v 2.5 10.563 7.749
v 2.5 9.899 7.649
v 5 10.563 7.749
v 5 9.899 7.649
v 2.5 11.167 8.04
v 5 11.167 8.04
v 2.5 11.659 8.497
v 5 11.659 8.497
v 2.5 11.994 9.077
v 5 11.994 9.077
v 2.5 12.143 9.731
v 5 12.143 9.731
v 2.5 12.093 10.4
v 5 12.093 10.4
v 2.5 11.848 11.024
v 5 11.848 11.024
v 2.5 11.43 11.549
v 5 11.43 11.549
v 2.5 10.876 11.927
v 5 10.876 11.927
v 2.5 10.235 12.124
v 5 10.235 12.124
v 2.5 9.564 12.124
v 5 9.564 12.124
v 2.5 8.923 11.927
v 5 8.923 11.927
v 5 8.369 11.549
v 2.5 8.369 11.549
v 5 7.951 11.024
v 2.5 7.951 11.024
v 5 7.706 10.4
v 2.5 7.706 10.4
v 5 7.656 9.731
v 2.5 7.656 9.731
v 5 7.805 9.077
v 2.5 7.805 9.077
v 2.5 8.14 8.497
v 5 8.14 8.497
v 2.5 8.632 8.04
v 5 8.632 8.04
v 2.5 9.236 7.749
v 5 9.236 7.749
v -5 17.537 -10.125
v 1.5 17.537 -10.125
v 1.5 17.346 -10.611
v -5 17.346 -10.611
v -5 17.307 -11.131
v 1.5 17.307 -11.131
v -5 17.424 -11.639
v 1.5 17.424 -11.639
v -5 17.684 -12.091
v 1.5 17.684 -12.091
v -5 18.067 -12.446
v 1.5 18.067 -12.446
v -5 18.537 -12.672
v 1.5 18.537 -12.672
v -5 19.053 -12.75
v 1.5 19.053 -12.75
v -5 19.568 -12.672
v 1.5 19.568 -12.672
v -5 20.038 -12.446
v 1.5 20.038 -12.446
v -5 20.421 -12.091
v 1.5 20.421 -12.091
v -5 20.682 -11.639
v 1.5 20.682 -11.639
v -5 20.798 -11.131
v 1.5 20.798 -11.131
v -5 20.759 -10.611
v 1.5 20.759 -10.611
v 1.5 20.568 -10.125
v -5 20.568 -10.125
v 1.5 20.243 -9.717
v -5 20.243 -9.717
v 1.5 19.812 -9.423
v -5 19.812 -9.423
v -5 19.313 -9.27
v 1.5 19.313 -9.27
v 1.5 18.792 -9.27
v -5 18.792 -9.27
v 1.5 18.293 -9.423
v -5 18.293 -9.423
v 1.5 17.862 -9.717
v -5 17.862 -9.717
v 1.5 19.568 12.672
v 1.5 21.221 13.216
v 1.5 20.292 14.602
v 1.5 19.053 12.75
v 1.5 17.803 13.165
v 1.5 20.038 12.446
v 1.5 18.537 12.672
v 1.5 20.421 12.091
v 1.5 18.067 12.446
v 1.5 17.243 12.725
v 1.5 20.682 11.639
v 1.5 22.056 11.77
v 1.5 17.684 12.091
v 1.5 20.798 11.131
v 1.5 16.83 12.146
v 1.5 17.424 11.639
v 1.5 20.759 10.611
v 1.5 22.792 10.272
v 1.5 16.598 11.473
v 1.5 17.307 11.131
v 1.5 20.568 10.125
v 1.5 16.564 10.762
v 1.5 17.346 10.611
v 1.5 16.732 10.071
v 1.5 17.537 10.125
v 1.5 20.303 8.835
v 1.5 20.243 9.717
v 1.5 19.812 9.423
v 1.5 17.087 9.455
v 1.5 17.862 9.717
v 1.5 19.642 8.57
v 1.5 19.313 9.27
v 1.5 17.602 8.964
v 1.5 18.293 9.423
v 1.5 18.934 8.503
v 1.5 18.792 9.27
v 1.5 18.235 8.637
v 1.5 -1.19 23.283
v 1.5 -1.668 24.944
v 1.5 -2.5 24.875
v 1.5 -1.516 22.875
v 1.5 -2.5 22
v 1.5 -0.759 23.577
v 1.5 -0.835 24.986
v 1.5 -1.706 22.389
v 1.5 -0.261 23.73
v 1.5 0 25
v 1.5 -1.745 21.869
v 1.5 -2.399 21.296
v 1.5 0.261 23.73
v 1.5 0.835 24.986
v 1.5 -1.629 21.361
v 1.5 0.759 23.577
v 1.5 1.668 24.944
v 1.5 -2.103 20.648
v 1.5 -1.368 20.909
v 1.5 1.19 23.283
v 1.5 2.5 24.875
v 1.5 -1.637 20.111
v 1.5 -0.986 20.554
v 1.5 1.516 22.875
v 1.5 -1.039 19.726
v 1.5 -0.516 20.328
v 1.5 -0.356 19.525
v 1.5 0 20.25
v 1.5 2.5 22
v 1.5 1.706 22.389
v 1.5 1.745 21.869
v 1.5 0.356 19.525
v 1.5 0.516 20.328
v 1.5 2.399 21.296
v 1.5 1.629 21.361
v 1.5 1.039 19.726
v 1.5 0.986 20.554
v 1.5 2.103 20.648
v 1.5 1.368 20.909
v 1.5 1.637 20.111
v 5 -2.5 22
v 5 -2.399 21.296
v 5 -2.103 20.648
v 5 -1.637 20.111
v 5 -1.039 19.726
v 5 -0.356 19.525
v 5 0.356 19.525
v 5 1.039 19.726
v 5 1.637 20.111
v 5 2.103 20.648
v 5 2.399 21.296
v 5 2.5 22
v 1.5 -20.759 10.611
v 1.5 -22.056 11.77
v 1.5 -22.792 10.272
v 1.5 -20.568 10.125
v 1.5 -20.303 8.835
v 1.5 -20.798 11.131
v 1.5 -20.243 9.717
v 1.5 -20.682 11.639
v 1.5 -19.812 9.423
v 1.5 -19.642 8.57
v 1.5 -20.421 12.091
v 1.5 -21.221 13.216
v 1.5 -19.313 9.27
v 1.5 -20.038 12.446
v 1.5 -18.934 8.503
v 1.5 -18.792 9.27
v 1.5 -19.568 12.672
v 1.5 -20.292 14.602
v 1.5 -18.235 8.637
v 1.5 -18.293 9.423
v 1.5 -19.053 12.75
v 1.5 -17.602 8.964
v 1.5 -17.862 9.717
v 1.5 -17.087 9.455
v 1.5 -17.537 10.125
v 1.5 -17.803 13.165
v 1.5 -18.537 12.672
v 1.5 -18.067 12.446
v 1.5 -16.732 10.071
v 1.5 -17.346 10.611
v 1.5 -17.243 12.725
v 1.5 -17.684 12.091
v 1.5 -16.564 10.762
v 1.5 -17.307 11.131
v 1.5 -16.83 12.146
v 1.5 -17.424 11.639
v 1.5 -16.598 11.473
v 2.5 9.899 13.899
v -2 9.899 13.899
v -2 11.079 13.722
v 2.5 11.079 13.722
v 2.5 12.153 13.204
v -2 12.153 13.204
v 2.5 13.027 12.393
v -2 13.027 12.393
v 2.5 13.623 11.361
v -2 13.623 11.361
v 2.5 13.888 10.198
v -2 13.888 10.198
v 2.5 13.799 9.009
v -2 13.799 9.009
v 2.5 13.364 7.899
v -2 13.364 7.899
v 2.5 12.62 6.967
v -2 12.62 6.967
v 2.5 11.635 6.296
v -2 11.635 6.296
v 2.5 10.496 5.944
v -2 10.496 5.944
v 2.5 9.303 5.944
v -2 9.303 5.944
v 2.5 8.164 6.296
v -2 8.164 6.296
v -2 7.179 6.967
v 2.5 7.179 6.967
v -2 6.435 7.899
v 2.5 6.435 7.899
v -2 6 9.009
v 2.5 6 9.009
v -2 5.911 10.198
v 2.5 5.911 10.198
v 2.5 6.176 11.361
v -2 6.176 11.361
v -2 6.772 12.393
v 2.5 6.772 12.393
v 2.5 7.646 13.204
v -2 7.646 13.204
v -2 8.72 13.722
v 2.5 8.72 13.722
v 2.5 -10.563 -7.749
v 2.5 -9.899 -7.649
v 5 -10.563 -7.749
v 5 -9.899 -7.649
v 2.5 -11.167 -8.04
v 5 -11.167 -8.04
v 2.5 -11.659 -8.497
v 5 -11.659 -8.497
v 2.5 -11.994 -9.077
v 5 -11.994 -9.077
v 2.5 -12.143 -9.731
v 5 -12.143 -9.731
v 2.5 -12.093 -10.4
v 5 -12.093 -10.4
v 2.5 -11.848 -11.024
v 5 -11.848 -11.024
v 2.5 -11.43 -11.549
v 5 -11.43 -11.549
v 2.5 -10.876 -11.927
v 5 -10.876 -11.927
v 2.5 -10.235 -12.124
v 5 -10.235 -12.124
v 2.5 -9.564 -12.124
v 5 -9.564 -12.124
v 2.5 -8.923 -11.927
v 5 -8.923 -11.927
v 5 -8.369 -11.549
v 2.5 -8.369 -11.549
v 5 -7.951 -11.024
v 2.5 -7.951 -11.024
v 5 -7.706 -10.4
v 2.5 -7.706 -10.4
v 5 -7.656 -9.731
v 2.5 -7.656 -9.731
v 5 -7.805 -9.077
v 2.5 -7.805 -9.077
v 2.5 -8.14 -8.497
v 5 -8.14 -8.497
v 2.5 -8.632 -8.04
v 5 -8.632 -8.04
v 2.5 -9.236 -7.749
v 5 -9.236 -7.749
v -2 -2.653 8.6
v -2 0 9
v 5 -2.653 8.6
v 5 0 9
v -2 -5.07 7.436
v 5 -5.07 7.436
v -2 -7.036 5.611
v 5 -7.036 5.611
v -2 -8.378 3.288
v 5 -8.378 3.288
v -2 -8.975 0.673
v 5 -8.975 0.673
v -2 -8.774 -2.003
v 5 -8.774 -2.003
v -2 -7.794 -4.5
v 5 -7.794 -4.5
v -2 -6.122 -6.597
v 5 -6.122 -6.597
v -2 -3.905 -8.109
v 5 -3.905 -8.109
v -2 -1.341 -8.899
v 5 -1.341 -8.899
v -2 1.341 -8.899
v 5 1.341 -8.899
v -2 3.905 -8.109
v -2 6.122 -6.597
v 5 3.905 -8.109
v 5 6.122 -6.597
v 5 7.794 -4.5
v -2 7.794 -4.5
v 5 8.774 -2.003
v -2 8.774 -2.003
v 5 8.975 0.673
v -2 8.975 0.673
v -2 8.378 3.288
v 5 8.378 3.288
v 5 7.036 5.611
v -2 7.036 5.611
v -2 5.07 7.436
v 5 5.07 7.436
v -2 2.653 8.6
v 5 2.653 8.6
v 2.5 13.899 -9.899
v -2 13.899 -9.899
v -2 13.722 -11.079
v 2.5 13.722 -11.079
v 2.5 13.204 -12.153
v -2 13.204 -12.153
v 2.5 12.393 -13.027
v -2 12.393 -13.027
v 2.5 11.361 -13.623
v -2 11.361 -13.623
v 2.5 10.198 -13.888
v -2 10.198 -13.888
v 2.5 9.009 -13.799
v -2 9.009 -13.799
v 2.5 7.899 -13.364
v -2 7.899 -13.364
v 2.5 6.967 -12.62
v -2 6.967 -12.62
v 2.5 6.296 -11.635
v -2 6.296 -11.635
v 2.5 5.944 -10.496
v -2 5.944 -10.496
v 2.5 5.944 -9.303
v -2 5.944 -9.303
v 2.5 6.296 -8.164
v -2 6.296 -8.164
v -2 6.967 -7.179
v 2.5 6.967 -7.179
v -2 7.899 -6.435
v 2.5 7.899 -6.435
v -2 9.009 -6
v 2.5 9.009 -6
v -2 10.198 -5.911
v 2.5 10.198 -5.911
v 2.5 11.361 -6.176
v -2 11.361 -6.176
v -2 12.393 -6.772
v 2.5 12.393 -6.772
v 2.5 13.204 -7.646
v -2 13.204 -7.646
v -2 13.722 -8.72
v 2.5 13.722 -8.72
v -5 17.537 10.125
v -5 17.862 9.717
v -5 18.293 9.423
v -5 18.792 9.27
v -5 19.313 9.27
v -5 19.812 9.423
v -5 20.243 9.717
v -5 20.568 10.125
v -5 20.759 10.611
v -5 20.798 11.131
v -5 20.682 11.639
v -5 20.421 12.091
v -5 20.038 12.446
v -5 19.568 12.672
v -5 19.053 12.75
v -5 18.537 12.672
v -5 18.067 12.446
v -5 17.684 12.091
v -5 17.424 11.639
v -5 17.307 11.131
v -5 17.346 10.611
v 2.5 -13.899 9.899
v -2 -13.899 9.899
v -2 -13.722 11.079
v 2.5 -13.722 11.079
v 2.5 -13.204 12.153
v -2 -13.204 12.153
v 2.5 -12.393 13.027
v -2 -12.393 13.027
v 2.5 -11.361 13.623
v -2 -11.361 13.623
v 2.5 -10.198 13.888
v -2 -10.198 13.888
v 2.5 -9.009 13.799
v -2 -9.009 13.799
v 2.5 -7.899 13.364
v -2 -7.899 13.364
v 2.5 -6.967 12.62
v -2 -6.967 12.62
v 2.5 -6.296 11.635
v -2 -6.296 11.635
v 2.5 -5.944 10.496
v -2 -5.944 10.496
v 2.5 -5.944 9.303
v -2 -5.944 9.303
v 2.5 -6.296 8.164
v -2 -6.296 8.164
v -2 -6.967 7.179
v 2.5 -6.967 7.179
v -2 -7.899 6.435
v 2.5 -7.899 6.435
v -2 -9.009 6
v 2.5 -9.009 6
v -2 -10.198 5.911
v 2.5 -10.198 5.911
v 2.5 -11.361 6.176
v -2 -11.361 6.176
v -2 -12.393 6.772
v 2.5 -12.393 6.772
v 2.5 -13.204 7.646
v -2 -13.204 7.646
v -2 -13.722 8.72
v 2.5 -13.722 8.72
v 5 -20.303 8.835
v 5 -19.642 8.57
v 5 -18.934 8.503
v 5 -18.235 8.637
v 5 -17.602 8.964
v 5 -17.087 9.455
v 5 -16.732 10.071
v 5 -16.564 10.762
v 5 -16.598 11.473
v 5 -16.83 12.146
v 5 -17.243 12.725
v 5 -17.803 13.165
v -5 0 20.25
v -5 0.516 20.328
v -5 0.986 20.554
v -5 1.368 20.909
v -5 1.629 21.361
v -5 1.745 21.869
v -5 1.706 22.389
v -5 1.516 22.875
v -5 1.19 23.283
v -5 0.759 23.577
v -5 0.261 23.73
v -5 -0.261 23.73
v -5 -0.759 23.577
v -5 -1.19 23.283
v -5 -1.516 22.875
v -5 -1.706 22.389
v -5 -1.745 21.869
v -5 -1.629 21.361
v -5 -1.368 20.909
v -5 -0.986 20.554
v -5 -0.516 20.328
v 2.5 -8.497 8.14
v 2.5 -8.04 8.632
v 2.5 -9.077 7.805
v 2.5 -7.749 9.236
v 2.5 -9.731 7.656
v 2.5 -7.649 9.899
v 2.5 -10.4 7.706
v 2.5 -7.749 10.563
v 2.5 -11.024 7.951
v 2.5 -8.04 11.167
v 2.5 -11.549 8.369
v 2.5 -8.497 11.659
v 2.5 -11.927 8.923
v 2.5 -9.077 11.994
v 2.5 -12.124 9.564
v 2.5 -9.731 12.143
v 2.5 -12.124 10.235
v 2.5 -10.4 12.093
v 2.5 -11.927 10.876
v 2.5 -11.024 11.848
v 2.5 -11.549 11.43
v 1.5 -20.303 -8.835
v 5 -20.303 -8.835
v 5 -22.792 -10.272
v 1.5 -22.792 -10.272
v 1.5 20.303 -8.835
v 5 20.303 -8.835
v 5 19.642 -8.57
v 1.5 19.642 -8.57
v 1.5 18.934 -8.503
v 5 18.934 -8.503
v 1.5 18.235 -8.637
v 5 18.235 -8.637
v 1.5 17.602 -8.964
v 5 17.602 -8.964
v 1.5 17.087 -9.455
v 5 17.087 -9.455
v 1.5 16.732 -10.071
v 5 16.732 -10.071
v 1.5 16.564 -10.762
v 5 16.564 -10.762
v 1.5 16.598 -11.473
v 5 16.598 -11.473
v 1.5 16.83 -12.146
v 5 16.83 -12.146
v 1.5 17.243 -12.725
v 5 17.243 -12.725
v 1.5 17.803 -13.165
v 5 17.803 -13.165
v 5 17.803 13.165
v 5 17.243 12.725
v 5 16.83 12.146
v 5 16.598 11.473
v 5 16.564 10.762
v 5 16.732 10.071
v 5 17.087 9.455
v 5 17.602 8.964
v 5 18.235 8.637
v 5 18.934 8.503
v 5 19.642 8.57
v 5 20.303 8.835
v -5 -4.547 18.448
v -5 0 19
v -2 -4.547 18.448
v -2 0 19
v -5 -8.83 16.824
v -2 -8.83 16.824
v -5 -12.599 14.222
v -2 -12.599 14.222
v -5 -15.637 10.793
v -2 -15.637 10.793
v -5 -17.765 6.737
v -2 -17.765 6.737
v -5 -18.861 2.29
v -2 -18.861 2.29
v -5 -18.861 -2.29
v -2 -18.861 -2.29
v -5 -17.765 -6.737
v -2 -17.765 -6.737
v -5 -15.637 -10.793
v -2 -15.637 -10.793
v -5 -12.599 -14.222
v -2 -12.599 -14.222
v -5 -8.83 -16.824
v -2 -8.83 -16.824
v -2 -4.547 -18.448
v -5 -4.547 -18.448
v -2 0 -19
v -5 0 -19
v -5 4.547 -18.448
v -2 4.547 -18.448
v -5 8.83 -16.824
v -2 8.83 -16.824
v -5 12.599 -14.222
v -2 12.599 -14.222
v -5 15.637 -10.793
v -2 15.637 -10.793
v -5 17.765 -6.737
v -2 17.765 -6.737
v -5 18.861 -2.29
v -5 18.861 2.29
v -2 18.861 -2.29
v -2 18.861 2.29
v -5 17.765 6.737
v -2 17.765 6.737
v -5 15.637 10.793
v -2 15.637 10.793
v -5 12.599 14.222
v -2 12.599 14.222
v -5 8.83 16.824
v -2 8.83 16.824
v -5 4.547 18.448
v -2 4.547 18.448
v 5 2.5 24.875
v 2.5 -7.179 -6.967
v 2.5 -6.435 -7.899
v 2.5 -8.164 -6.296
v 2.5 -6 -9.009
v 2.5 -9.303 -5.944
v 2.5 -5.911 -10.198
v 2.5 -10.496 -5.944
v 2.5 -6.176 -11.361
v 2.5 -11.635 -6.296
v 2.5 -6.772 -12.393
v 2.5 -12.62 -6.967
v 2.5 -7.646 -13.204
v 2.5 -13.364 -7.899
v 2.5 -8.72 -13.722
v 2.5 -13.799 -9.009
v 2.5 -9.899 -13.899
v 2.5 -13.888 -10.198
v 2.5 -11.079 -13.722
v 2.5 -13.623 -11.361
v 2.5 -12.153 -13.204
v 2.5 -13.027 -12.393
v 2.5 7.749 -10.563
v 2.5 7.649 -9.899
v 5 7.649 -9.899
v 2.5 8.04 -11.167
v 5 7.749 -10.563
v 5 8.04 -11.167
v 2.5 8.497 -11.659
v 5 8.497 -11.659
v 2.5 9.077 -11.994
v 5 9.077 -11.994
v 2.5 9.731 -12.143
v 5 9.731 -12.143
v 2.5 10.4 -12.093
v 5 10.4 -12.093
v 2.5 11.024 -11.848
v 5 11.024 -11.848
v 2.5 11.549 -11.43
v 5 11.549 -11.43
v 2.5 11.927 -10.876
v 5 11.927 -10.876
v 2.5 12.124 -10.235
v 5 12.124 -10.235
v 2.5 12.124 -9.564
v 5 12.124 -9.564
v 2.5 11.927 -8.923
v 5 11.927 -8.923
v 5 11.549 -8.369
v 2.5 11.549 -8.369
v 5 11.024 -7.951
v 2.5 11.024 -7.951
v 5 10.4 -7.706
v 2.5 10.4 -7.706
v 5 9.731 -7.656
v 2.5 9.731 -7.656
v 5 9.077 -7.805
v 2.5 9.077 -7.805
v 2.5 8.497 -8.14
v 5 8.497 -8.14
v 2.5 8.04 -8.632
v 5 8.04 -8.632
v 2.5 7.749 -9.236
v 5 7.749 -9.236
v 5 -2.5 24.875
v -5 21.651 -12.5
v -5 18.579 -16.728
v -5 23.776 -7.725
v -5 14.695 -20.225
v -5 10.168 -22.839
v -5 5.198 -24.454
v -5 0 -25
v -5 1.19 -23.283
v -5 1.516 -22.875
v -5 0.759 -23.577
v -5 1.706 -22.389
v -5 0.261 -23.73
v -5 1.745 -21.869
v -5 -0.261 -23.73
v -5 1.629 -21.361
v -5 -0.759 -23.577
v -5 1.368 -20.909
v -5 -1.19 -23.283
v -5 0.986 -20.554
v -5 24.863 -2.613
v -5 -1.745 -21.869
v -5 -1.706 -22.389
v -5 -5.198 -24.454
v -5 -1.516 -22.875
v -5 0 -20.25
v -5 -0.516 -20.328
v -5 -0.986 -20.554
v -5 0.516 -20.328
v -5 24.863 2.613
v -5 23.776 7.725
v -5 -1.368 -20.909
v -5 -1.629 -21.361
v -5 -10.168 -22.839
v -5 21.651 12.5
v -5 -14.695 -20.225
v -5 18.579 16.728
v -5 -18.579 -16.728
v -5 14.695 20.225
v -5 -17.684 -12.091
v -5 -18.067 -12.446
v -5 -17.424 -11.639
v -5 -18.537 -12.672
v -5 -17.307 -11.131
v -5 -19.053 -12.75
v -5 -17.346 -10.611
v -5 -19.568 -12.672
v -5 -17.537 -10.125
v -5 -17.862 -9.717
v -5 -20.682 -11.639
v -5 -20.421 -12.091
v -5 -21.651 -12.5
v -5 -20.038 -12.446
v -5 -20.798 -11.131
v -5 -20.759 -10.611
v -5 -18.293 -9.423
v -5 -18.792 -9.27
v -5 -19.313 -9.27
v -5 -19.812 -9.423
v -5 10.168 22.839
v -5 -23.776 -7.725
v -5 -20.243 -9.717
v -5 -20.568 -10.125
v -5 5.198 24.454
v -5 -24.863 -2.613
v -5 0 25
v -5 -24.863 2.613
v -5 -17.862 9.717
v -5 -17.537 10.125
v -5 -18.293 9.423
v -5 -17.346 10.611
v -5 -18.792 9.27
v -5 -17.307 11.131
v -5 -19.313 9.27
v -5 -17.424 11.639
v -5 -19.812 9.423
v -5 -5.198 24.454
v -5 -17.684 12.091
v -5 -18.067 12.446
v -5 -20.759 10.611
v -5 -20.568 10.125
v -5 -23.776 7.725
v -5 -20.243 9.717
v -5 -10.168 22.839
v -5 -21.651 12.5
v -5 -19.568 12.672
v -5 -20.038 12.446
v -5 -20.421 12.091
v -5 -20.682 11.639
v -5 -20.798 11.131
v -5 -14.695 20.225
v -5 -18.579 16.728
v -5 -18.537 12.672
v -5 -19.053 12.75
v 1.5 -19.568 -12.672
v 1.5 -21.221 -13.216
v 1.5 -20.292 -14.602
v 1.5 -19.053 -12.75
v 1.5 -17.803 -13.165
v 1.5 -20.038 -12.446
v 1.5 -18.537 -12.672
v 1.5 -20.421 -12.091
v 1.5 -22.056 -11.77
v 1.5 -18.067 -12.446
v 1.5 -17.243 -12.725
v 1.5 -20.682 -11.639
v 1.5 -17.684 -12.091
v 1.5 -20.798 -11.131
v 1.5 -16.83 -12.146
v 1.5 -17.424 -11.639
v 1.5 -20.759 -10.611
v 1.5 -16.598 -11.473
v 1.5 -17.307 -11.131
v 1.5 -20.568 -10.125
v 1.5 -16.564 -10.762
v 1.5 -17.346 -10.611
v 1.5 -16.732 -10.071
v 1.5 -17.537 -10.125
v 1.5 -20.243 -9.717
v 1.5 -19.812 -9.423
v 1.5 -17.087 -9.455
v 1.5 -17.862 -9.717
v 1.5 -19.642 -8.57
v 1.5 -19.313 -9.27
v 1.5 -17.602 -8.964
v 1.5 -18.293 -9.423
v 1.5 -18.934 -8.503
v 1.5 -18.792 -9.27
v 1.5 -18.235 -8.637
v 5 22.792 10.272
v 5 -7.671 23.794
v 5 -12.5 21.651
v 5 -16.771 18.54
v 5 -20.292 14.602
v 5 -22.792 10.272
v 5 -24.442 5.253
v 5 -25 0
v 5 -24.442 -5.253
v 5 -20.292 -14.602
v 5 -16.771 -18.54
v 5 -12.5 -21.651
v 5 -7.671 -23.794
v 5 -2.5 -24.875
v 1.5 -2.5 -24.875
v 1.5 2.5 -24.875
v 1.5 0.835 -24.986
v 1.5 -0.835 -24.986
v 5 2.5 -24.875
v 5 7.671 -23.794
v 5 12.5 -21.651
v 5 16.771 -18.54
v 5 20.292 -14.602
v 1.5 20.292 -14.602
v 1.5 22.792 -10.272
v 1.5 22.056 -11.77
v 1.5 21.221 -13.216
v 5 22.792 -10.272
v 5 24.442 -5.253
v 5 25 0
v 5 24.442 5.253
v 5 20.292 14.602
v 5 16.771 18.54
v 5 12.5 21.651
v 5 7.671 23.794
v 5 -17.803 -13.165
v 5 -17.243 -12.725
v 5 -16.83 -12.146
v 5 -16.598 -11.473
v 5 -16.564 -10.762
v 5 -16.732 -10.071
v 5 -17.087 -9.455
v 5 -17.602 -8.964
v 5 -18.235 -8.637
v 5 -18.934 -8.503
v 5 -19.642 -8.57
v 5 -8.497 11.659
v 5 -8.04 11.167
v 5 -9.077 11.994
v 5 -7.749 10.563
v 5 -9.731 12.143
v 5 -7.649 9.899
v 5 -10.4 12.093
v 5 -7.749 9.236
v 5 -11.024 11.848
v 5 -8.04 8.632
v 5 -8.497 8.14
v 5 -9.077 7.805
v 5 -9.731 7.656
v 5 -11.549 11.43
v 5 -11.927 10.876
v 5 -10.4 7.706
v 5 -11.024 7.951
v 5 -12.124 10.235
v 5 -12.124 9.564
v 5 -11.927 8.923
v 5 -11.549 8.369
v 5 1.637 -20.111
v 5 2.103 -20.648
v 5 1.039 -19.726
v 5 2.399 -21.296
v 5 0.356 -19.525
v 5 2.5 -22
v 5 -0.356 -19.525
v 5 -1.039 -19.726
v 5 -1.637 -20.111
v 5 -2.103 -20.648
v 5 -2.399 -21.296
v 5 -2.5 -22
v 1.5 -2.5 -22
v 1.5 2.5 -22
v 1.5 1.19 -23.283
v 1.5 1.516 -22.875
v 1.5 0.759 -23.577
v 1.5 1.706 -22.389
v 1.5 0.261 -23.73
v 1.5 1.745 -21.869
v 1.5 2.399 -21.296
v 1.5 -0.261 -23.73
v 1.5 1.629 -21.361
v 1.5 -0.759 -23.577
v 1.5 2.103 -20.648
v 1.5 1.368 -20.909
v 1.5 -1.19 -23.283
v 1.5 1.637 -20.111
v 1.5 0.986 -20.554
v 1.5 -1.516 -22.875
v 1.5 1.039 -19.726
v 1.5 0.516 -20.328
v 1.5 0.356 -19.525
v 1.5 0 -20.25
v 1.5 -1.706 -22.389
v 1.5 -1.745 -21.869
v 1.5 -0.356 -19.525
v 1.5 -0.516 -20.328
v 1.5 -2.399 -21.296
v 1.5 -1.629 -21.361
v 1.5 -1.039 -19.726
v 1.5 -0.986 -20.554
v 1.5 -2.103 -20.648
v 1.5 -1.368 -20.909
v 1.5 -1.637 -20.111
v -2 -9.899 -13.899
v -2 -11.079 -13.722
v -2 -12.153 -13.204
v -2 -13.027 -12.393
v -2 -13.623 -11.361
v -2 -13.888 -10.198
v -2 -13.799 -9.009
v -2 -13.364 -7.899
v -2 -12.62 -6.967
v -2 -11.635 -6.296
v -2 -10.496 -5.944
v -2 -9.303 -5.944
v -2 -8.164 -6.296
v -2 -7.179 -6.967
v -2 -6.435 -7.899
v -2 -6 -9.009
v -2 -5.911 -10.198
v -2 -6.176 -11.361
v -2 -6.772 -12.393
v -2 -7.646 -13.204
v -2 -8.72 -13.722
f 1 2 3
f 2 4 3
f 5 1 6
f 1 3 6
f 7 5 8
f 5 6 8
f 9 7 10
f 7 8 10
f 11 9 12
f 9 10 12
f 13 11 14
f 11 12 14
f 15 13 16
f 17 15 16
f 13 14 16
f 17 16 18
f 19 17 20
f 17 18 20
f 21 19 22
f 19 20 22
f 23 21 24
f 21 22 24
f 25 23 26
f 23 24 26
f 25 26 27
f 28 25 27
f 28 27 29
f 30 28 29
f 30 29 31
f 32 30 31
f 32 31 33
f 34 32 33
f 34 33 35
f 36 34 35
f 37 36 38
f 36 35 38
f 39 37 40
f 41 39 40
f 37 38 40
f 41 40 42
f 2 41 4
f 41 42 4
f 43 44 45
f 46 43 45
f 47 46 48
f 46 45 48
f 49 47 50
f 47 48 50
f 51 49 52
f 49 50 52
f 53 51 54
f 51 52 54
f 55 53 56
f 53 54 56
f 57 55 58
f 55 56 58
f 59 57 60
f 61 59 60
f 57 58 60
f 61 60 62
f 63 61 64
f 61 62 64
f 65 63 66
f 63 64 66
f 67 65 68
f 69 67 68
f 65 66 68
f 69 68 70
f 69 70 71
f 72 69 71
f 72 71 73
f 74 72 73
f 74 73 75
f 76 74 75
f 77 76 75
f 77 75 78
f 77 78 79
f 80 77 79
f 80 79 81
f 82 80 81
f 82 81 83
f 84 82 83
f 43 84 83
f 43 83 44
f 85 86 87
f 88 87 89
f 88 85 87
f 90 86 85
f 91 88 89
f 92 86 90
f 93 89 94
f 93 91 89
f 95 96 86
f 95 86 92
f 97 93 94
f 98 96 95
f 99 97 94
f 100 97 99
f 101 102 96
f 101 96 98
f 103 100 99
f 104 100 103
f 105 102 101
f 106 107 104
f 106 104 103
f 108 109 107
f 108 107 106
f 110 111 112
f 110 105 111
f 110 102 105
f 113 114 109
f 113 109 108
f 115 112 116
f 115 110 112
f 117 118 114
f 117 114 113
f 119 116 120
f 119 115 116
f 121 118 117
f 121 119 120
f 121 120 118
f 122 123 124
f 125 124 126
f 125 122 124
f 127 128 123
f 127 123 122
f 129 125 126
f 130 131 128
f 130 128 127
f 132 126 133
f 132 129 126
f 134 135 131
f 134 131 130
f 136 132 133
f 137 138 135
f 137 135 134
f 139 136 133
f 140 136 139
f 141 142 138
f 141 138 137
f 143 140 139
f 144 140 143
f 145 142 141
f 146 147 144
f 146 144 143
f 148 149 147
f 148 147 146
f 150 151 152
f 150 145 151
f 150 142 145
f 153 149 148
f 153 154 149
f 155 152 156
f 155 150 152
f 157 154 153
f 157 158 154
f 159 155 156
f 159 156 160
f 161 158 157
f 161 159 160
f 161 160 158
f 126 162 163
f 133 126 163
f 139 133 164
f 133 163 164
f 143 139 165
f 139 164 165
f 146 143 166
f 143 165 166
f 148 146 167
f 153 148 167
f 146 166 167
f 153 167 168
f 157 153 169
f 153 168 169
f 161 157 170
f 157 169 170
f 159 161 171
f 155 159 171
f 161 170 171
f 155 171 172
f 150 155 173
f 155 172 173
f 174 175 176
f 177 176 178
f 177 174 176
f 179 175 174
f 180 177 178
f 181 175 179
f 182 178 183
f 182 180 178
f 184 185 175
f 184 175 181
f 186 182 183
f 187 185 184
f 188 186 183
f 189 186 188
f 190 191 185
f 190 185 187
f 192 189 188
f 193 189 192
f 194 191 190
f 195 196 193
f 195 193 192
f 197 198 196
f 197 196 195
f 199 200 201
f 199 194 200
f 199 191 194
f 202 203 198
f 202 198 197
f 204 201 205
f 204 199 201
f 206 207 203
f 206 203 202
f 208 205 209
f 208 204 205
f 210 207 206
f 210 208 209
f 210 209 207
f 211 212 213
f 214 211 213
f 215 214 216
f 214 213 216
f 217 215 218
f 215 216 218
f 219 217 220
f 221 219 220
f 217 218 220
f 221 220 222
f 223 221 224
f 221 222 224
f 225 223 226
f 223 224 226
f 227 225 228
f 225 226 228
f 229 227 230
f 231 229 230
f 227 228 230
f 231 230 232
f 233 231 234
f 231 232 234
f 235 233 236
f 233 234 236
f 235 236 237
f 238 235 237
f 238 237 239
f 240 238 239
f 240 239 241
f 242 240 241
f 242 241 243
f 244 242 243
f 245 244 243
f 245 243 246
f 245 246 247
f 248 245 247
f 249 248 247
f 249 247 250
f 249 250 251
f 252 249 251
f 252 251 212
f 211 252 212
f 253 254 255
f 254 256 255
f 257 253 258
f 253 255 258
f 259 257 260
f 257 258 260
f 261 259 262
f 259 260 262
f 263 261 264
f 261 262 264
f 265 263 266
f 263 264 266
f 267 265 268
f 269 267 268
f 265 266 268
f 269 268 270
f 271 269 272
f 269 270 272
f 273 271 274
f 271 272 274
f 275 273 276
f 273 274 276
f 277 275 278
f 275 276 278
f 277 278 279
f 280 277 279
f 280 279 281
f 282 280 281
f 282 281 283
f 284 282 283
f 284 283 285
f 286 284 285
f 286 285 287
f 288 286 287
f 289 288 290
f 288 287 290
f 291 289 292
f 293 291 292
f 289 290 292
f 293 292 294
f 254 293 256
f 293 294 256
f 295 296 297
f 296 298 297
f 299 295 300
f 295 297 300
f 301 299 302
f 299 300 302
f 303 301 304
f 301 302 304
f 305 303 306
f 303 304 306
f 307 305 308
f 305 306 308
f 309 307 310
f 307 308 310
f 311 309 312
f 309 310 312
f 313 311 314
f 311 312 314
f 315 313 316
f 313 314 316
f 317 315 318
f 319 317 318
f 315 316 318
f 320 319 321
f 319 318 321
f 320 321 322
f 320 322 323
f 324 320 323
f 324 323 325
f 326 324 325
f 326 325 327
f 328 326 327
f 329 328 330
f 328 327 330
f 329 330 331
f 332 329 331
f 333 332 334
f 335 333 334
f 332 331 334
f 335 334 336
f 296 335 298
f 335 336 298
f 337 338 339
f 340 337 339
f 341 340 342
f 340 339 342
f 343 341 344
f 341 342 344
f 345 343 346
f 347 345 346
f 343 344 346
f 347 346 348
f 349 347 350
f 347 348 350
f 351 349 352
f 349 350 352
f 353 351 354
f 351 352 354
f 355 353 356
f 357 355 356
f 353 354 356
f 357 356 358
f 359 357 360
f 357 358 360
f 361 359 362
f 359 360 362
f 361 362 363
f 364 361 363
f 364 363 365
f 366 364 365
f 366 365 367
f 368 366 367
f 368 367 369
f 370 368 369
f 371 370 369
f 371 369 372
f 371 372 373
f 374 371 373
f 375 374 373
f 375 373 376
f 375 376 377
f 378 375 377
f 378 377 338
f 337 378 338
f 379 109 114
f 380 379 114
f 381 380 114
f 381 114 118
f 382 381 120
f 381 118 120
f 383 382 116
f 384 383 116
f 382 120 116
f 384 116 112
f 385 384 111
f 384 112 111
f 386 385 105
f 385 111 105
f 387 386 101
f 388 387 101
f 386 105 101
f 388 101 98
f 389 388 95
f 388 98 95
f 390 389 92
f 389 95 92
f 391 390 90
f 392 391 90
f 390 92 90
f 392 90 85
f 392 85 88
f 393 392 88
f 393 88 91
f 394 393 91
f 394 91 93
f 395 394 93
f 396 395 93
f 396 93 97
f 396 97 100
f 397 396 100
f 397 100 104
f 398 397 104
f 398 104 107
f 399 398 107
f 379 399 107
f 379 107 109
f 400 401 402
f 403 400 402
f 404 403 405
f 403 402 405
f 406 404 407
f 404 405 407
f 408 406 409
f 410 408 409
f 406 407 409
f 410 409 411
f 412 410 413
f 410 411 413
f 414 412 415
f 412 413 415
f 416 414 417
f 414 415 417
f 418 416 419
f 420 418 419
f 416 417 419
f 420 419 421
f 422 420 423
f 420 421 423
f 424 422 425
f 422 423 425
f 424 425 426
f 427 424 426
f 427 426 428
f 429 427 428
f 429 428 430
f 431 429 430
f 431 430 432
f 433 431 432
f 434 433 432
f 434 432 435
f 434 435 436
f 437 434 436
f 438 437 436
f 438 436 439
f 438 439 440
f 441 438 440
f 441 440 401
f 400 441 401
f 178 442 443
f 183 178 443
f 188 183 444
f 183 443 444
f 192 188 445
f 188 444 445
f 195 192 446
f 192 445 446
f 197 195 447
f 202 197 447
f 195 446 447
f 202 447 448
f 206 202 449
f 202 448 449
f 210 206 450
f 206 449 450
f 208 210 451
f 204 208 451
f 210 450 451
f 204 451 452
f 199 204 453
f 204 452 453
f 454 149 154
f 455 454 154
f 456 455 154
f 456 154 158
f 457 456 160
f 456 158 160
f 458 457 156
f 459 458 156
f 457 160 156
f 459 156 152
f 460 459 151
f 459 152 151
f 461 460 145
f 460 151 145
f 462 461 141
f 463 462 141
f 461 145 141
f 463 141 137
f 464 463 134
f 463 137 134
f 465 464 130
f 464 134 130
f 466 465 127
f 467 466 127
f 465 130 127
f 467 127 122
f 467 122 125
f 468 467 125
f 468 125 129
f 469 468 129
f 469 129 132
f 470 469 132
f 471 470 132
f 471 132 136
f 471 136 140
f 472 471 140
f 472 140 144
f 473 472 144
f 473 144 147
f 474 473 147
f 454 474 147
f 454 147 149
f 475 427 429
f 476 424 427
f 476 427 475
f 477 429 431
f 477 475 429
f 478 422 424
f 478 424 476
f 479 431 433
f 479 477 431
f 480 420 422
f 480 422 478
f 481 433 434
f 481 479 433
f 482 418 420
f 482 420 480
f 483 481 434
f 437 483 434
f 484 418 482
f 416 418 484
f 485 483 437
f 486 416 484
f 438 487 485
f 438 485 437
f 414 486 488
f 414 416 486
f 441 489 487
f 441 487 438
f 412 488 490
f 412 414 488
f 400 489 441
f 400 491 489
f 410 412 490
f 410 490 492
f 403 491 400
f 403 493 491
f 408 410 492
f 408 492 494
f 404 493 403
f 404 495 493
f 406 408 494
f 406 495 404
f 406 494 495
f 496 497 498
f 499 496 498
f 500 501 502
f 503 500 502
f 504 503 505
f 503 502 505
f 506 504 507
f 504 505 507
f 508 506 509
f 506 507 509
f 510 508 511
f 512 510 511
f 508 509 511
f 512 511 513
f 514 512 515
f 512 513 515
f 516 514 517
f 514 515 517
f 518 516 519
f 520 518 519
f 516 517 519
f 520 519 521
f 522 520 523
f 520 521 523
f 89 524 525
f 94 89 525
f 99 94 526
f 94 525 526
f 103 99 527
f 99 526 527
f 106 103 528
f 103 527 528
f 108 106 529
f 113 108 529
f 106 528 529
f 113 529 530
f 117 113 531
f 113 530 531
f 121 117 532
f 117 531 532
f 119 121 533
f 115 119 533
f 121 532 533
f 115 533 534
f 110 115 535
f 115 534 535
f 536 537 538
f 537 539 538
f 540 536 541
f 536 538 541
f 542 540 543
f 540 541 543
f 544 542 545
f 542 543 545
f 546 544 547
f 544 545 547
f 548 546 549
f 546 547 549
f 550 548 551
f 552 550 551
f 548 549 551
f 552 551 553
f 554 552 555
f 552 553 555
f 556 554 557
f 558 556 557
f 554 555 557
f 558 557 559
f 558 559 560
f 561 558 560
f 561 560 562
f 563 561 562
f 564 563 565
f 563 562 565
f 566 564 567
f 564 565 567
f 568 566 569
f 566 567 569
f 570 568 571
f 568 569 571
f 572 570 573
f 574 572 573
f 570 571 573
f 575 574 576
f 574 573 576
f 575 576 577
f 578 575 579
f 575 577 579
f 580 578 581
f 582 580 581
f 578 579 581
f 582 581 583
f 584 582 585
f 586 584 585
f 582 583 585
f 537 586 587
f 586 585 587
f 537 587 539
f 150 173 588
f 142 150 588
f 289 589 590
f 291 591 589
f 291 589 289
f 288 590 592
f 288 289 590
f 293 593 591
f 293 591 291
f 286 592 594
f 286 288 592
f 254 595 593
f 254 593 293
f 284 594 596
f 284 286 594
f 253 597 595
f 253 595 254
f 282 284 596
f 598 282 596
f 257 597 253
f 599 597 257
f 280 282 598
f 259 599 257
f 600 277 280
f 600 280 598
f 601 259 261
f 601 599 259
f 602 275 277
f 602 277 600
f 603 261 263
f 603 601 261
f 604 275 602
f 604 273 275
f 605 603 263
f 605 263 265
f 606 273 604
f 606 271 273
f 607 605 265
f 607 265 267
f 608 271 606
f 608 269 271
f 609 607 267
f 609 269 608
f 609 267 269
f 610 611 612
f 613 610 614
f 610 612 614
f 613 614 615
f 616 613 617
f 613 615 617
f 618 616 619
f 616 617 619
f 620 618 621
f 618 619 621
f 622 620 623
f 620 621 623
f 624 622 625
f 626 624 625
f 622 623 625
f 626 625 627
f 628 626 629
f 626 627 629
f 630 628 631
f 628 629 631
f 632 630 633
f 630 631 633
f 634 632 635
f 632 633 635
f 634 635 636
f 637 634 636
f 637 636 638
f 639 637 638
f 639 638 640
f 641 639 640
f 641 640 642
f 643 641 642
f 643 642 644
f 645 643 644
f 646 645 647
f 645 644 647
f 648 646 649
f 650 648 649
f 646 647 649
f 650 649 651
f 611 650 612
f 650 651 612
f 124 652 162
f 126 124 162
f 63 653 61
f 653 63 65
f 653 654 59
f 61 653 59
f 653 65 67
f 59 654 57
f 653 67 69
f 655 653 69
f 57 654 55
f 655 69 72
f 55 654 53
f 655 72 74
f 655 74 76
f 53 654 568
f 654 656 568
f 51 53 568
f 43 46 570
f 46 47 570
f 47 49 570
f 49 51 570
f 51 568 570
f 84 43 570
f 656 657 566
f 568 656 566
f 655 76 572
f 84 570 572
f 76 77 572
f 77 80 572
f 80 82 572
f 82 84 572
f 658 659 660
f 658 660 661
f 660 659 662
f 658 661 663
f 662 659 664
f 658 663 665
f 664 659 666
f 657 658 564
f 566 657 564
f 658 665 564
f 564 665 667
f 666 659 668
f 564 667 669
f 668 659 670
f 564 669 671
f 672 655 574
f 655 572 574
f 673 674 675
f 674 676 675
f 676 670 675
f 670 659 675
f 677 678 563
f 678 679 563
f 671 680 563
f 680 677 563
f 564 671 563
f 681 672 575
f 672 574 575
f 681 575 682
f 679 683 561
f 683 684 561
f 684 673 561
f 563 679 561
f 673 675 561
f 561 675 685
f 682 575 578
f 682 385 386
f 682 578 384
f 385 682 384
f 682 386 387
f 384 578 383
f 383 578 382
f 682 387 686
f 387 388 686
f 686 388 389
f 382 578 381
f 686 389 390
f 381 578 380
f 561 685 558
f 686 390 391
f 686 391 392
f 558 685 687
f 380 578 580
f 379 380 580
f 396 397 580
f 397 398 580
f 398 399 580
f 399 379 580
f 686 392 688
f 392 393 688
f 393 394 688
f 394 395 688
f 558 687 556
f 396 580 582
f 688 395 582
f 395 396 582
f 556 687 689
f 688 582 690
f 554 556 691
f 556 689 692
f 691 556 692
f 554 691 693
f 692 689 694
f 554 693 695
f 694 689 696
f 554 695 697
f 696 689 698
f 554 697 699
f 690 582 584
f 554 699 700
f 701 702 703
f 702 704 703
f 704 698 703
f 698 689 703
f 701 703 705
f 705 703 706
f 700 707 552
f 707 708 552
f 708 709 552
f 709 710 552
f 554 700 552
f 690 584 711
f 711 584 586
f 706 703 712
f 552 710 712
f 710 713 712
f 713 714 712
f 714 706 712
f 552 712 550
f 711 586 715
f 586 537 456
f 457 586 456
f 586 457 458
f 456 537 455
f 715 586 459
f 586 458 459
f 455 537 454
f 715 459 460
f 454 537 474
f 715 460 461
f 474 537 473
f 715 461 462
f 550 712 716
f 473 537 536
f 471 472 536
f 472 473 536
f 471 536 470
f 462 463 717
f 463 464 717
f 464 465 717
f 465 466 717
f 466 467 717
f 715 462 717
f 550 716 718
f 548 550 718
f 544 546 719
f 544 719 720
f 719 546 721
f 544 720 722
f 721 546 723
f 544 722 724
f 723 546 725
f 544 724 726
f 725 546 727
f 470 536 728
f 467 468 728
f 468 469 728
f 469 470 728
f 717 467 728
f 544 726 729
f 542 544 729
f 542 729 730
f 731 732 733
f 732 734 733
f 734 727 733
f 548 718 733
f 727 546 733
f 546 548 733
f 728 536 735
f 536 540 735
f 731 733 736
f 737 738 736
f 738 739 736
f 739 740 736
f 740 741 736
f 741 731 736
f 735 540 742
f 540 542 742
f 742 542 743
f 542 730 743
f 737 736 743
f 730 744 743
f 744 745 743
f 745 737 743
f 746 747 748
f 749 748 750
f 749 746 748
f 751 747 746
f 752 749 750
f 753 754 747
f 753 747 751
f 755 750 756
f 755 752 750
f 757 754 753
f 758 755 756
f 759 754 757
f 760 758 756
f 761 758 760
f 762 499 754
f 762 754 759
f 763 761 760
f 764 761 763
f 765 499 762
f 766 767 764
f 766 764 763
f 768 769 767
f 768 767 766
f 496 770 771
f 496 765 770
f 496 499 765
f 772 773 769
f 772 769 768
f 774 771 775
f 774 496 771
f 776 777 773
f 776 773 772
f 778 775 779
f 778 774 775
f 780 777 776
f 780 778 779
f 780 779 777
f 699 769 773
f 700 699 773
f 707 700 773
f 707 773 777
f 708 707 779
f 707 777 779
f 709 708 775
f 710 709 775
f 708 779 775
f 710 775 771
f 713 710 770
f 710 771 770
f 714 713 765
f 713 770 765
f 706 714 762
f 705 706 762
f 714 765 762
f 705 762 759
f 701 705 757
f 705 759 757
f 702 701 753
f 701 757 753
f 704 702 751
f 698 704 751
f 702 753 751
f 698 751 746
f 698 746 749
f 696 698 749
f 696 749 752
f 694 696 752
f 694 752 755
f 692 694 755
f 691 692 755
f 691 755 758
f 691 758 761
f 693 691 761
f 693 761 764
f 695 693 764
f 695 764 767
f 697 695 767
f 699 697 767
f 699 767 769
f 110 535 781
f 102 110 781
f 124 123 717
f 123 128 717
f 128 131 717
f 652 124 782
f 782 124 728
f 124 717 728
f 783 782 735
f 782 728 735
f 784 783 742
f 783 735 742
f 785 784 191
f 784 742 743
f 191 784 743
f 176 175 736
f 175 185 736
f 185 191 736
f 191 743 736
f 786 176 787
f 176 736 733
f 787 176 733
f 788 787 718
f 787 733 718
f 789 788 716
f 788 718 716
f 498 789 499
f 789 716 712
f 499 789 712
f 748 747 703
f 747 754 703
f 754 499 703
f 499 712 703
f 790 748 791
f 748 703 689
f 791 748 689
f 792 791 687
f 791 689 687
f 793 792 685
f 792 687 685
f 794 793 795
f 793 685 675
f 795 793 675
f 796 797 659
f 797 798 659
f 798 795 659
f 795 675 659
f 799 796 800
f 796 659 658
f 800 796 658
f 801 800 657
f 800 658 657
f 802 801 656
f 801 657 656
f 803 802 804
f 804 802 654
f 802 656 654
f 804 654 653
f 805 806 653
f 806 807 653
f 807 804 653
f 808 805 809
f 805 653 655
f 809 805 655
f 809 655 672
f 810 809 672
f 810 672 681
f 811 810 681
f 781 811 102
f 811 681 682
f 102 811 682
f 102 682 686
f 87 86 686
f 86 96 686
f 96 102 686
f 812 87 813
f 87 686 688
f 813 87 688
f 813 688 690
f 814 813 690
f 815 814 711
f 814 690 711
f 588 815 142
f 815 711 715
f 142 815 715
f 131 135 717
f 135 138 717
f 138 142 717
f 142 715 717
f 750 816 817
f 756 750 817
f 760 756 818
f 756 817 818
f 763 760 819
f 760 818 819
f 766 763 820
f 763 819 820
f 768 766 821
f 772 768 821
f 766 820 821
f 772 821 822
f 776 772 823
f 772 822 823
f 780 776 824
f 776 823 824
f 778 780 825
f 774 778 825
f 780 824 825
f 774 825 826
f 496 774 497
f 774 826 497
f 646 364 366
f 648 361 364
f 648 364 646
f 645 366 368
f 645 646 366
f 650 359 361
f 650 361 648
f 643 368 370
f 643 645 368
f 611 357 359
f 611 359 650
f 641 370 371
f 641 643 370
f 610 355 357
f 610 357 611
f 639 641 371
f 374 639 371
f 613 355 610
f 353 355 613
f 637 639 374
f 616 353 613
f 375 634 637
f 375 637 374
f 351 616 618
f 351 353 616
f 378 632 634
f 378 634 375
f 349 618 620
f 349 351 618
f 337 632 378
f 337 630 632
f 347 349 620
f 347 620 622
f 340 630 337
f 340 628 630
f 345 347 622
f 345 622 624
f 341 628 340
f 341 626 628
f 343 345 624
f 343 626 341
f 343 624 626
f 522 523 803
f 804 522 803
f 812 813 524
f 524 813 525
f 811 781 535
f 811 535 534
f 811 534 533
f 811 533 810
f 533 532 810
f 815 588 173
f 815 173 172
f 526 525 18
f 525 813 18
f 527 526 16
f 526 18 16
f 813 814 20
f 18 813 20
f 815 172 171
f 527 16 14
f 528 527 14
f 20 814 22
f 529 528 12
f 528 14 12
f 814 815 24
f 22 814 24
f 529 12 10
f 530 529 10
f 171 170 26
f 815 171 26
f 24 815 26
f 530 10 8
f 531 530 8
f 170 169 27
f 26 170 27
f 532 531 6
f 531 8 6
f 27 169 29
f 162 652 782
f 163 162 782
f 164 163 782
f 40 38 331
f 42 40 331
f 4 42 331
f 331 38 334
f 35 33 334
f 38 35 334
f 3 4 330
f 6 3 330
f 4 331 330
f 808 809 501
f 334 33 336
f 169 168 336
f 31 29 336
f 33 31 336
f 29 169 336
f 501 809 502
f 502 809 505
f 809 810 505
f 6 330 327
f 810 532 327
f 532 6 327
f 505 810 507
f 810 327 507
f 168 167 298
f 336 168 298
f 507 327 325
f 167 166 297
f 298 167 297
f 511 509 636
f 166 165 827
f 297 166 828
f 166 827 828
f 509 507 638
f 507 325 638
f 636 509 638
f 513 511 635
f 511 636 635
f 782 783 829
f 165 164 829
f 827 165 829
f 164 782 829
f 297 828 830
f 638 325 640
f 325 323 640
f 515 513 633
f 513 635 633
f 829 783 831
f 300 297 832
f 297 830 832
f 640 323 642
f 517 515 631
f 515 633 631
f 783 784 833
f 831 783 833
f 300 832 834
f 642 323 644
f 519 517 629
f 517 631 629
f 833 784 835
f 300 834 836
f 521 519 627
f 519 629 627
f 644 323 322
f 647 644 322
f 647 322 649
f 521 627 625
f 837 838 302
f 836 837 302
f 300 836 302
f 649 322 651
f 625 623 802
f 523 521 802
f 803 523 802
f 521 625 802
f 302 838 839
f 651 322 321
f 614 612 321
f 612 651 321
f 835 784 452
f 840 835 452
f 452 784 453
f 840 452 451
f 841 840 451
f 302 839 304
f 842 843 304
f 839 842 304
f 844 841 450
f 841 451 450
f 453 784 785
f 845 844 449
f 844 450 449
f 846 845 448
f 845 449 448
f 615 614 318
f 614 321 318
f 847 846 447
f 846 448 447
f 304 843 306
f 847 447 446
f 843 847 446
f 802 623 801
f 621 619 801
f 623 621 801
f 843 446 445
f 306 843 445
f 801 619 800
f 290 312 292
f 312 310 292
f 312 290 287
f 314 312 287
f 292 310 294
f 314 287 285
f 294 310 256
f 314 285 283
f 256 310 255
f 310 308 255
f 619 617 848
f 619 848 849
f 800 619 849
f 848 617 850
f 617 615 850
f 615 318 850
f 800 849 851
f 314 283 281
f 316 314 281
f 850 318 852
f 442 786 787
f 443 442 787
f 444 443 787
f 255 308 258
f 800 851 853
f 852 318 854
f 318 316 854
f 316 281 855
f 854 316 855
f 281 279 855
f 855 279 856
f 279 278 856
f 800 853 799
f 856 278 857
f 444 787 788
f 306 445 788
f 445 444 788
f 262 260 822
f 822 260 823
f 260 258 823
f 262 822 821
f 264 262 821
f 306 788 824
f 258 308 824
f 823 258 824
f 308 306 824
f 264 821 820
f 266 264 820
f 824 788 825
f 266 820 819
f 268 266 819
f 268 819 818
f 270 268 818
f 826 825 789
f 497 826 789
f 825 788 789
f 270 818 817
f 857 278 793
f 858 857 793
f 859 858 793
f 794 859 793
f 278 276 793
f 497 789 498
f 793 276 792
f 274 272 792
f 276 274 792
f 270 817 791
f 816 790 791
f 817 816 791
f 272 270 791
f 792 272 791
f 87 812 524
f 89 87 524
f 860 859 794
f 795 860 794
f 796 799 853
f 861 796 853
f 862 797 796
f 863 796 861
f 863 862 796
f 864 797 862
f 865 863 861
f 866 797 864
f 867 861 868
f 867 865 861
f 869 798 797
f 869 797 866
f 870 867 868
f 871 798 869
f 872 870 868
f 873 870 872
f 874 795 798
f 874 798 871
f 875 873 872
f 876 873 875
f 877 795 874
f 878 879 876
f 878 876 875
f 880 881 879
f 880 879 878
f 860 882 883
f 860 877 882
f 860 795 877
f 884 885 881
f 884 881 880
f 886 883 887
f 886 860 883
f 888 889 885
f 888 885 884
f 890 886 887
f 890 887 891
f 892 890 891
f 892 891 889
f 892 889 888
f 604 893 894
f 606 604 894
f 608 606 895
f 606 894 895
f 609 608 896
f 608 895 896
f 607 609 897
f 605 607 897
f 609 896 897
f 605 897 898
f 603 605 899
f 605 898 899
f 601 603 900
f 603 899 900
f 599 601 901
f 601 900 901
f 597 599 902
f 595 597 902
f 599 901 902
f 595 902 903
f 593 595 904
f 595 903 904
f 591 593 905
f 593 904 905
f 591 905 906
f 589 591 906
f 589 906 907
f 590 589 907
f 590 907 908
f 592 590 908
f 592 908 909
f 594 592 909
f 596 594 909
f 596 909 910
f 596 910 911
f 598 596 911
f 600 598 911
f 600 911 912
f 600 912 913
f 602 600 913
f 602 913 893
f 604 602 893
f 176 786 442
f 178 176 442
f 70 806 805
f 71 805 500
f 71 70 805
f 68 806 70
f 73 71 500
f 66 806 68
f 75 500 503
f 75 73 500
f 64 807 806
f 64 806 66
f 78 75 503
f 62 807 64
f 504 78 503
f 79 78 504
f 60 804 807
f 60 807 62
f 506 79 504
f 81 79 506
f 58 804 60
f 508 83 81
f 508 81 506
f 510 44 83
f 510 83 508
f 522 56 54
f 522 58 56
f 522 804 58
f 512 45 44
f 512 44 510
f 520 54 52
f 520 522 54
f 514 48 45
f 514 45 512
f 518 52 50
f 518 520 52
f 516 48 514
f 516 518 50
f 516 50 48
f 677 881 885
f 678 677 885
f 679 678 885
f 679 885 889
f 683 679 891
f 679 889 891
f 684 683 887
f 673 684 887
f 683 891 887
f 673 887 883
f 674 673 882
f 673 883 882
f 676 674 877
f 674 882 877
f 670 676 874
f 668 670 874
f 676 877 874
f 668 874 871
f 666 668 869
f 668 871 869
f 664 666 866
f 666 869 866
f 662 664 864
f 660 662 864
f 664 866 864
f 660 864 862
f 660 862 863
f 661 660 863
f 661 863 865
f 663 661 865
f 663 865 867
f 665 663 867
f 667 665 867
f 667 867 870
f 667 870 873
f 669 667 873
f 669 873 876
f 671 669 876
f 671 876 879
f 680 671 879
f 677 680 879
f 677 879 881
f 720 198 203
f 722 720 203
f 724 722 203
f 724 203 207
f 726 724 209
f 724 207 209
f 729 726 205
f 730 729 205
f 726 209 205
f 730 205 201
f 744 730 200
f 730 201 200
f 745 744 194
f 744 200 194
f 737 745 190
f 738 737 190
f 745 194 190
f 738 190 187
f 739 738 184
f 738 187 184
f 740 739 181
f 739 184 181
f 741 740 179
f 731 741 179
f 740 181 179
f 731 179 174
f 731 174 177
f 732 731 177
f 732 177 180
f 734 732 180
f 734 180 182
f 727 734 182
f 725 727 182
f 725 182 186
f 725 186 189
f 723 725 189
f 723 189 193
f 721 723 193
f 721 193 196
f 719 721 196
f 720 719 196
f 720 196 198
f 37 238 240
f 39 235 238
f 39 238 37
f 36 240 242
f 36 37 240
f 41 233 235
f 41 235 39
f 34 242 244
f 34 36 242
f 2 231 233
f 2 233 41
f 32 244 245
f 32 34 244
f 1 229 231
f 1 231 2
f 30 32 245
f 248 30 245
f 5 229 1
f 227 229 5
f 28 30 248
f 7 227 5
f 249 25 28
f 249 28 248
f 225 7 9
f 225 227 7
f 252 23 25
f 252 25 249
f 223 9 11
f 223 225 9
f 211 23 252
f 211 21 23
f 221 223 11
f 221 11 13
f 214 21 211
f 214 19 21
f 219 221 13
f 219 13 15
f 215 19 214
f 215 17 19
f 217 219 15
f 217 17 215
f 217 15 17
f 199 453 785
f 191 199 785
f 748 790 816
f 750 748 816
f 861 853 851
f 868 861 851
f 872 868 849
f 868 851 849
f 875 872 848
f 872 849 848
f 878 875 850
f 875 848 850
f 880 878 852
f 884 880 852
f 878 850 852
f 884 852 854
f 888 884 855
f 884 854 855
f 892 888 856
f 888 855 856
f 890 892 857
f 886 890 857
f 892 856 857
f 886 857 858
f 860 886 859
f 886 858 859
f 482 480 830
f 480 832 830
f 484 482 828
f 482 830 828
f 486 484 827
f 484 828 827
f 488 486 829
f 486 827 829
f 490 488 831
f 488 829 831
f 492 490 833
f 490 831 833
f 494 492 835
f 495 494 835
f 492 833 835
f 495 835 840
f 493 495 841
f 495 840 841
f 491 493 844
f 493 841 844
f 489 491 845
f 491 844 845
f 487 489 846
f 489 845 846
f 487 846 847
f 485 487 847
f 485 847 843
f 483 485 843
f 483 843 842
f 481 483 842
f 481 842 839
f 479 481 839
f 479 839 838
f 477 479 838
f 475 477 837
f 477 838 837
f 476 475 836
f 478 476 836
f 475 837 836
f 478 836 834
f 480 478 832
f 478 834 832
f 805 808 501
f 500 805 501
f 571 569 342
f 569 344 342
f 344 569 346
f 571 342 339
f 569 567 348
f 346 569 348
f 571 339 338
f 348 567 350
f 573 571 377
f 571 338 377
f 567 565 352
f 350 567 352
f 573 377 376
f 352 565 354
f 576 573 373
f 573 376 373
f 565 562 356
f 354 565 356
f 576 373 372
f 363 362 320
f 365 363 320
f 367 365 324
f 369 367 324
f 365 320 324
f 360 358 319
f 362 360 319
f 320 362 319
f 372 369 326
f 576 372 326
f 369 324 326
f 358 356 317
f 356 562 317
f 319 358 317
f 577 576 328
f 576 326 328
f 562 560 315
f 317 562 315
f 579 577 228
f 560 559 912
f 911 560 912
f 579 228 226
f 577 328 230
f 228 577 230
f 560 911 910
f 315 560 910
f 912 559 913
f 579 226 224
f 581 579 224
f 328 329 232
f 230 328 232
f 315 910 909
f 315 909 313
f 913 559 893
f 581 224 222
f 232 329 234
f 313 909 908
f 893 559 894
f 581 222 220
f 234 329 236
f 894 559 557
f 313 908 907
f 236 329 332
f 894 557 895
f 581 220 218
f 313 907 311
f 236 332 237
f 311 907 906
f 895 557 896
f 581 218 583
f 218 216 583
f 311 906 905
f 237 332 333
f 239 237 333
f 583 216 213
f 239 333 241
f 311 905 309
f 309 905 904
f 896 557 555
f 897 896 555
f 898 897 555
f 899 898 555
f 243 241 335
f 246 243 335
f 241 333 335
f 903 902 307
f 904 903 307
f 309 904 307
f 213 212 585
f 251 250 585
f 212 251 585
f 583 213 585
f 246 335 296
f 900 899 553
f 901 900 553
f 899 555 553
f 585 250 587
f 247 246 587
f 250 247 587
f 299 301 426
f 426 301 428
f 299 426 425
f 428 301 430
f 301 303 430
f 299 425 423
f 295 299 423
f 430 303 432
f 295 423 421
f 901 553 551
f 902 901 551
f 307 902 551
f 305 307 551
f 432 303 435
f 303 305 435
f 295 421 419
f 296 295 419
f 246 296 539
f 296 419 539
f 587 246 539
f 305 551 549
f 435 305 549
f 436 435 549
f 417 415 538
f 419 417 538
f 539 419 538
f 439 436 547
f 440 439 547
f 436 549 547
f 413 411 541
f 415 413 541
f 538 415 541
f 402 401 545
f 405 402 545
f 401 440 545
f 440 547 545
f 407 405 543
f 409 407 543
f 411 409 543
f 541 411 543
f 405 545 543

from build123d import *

# Parameters (mm, degrees)
ENL_V_MAT_EXTRU_1_DEPTH                         = 3.5
R_P_TITION_CIRCULAIRE1_COUNT                    = 6
ESQUISSE3_R                                     = 1.75
ENL_V_MAT_EXTRU_2_DEPTH                         = 36.947878936
R_P_TITION_CIRCULAIRE2_COUNT                    = 6
CHAMBRAGE_POUR_VIS_T_TE_CYLINDRIQUE_D           = 4.5
CHAMBRAGE_POUR_VIS_T_TE_CYLINDRIQUE_CBORE_D     = 8
CHAMBRAGE_POUR_VIS_T_TE_CYLINDRIQUE_CBORE_DEPTH = 4.5
R_P_TITION_CIRCULAIRE3_COUNT                    = 4


with BuildPart() as part:
    # Esquisse1 → Base-Révolution (revolve)
    with BuildSketch(Plane.XY, mode=Mode.PRIVATE) as base_r_volution_sk:
        Polygon((-5, 25), (-5, 19), (-2, 19), (-2, 9), (5, 9), (5, 25), align=None)
    revolve(base_r_volution_sk.sketch.rotate(Axis((-14.936373376, 0, 0), (1, 0, 0)), 90), axis=Axis((-14.936373376, 0, 0), (1, 0, 0)))

    # Esquisse2 → Enlèv. mat.-Extru.1 (cut)
    with BuildSketch(Plane(origin=(5, 0, 0), x_dir=(0, 0, -1), z_dir=(1, 0, 0))):
        with BuildLine():
            Line((-22, 2.5), (-25.435164017, 2.5))
            Line((-25.435164017, 2.5), (-25.435164017, -2.5))
            Line((-25.435164017, -2.5), (-22, -2.5))
            ThreePointArc((-22, -2.5), (-19.5, 0), (-22, 2.5))
        make_face()
    enl_v_mat_extru_1 = extrude(amount=-ENL_V_MAT_EXTRU_1_DEPTH, mode=Mode.SUBTRACT)

    # Répétition circulaire1: Enlèv. mat.-Extru.1 ×6 about axis
    r_p_tition_circulaire1_axis = Axis((0, 0, 0), (1, 0, 0))
    for i in range(1, R_P_TITION_CIRCULAIRE1_COUNT):
        add(enl_v_mat_extru_1.rotate(r_p_tition_circulaire1_axis, i * 360 / R_P_TITION_CIRCULAIRE1_COUNT), mode=Mode.SUBTRACT)

    # Esquisse3 → Enlèv. mat.-Extru.2 (cut, through all)
    with BuildSketch(Plane(origin=(1.5, 0, 0), x_dir=(0, 0, -1), z_dir=(1, 0, 0))):
        with Locations((-22, 0)):
            Circle(ESQUISSE3_R)
    enl_v_mat_extru_2 = extrude(amount=-ENL_V_MAT_EXTRU_2_DEPTH, mode=Mode.SUBTRACT)

    # Répétition circulaire2: Enlèv. mat.-Extru.2 ×6 about axis
    r_p_tition_circulaire2_axis = Axis((0, 0, 0), (1, 0, 0))
    for i in range(1, R_P_TITION_CIRCULAIRE2_COUNT):
        add(enl_v_mat_extru_2.rotate(r_p_tition_circulaire2_axis, i * 360 / R_P_TITION_CIRCULAIRE2_COUNT), mode=Mode.SUBTRACT)

    # Chambrage pour vis à tête cylindrique à 6 pans creux (vis CHC) M41 (through all)
    with Locations(Plane.ZY.offset(2)):
        with Locations((9.899494937, 9.899494937)):
            chambrage_pour_vis_t_te_cylindrique = CounterBoreHole(CHAMBRAGE_POUR_VIS_T_TE_CYLINDRIQUE_D / 2, CHAMBRAGE_POUR_VIS_T_TE_CYLINDRIQUE_CBORE_D / 2, CHAMBRAGE_POUR_VIS_T_TE_CYLINDRIQUE_CBORE_DEPTH)

    # Répétition circulaire3: Chambrage pour vis à tête cylindrique à 6 pans creux (vis CHC) M41 ×4 about axis
    r_p_tition_circulaire3_axis = Axis((0, 0, 0), (1, 0, 0))
    for i in range(1, R_P_TITION_CIRCULAIRE3_COUNT):
        add(chambrage_pour_vis_t_te_cylindrique.rotate(r_p_tition_circulaire3_axis, i * 360 / R_P_TITION_CIRCULAIRE3_COUNT), mode=Mode.SUBTRACT)


solid = part.part
